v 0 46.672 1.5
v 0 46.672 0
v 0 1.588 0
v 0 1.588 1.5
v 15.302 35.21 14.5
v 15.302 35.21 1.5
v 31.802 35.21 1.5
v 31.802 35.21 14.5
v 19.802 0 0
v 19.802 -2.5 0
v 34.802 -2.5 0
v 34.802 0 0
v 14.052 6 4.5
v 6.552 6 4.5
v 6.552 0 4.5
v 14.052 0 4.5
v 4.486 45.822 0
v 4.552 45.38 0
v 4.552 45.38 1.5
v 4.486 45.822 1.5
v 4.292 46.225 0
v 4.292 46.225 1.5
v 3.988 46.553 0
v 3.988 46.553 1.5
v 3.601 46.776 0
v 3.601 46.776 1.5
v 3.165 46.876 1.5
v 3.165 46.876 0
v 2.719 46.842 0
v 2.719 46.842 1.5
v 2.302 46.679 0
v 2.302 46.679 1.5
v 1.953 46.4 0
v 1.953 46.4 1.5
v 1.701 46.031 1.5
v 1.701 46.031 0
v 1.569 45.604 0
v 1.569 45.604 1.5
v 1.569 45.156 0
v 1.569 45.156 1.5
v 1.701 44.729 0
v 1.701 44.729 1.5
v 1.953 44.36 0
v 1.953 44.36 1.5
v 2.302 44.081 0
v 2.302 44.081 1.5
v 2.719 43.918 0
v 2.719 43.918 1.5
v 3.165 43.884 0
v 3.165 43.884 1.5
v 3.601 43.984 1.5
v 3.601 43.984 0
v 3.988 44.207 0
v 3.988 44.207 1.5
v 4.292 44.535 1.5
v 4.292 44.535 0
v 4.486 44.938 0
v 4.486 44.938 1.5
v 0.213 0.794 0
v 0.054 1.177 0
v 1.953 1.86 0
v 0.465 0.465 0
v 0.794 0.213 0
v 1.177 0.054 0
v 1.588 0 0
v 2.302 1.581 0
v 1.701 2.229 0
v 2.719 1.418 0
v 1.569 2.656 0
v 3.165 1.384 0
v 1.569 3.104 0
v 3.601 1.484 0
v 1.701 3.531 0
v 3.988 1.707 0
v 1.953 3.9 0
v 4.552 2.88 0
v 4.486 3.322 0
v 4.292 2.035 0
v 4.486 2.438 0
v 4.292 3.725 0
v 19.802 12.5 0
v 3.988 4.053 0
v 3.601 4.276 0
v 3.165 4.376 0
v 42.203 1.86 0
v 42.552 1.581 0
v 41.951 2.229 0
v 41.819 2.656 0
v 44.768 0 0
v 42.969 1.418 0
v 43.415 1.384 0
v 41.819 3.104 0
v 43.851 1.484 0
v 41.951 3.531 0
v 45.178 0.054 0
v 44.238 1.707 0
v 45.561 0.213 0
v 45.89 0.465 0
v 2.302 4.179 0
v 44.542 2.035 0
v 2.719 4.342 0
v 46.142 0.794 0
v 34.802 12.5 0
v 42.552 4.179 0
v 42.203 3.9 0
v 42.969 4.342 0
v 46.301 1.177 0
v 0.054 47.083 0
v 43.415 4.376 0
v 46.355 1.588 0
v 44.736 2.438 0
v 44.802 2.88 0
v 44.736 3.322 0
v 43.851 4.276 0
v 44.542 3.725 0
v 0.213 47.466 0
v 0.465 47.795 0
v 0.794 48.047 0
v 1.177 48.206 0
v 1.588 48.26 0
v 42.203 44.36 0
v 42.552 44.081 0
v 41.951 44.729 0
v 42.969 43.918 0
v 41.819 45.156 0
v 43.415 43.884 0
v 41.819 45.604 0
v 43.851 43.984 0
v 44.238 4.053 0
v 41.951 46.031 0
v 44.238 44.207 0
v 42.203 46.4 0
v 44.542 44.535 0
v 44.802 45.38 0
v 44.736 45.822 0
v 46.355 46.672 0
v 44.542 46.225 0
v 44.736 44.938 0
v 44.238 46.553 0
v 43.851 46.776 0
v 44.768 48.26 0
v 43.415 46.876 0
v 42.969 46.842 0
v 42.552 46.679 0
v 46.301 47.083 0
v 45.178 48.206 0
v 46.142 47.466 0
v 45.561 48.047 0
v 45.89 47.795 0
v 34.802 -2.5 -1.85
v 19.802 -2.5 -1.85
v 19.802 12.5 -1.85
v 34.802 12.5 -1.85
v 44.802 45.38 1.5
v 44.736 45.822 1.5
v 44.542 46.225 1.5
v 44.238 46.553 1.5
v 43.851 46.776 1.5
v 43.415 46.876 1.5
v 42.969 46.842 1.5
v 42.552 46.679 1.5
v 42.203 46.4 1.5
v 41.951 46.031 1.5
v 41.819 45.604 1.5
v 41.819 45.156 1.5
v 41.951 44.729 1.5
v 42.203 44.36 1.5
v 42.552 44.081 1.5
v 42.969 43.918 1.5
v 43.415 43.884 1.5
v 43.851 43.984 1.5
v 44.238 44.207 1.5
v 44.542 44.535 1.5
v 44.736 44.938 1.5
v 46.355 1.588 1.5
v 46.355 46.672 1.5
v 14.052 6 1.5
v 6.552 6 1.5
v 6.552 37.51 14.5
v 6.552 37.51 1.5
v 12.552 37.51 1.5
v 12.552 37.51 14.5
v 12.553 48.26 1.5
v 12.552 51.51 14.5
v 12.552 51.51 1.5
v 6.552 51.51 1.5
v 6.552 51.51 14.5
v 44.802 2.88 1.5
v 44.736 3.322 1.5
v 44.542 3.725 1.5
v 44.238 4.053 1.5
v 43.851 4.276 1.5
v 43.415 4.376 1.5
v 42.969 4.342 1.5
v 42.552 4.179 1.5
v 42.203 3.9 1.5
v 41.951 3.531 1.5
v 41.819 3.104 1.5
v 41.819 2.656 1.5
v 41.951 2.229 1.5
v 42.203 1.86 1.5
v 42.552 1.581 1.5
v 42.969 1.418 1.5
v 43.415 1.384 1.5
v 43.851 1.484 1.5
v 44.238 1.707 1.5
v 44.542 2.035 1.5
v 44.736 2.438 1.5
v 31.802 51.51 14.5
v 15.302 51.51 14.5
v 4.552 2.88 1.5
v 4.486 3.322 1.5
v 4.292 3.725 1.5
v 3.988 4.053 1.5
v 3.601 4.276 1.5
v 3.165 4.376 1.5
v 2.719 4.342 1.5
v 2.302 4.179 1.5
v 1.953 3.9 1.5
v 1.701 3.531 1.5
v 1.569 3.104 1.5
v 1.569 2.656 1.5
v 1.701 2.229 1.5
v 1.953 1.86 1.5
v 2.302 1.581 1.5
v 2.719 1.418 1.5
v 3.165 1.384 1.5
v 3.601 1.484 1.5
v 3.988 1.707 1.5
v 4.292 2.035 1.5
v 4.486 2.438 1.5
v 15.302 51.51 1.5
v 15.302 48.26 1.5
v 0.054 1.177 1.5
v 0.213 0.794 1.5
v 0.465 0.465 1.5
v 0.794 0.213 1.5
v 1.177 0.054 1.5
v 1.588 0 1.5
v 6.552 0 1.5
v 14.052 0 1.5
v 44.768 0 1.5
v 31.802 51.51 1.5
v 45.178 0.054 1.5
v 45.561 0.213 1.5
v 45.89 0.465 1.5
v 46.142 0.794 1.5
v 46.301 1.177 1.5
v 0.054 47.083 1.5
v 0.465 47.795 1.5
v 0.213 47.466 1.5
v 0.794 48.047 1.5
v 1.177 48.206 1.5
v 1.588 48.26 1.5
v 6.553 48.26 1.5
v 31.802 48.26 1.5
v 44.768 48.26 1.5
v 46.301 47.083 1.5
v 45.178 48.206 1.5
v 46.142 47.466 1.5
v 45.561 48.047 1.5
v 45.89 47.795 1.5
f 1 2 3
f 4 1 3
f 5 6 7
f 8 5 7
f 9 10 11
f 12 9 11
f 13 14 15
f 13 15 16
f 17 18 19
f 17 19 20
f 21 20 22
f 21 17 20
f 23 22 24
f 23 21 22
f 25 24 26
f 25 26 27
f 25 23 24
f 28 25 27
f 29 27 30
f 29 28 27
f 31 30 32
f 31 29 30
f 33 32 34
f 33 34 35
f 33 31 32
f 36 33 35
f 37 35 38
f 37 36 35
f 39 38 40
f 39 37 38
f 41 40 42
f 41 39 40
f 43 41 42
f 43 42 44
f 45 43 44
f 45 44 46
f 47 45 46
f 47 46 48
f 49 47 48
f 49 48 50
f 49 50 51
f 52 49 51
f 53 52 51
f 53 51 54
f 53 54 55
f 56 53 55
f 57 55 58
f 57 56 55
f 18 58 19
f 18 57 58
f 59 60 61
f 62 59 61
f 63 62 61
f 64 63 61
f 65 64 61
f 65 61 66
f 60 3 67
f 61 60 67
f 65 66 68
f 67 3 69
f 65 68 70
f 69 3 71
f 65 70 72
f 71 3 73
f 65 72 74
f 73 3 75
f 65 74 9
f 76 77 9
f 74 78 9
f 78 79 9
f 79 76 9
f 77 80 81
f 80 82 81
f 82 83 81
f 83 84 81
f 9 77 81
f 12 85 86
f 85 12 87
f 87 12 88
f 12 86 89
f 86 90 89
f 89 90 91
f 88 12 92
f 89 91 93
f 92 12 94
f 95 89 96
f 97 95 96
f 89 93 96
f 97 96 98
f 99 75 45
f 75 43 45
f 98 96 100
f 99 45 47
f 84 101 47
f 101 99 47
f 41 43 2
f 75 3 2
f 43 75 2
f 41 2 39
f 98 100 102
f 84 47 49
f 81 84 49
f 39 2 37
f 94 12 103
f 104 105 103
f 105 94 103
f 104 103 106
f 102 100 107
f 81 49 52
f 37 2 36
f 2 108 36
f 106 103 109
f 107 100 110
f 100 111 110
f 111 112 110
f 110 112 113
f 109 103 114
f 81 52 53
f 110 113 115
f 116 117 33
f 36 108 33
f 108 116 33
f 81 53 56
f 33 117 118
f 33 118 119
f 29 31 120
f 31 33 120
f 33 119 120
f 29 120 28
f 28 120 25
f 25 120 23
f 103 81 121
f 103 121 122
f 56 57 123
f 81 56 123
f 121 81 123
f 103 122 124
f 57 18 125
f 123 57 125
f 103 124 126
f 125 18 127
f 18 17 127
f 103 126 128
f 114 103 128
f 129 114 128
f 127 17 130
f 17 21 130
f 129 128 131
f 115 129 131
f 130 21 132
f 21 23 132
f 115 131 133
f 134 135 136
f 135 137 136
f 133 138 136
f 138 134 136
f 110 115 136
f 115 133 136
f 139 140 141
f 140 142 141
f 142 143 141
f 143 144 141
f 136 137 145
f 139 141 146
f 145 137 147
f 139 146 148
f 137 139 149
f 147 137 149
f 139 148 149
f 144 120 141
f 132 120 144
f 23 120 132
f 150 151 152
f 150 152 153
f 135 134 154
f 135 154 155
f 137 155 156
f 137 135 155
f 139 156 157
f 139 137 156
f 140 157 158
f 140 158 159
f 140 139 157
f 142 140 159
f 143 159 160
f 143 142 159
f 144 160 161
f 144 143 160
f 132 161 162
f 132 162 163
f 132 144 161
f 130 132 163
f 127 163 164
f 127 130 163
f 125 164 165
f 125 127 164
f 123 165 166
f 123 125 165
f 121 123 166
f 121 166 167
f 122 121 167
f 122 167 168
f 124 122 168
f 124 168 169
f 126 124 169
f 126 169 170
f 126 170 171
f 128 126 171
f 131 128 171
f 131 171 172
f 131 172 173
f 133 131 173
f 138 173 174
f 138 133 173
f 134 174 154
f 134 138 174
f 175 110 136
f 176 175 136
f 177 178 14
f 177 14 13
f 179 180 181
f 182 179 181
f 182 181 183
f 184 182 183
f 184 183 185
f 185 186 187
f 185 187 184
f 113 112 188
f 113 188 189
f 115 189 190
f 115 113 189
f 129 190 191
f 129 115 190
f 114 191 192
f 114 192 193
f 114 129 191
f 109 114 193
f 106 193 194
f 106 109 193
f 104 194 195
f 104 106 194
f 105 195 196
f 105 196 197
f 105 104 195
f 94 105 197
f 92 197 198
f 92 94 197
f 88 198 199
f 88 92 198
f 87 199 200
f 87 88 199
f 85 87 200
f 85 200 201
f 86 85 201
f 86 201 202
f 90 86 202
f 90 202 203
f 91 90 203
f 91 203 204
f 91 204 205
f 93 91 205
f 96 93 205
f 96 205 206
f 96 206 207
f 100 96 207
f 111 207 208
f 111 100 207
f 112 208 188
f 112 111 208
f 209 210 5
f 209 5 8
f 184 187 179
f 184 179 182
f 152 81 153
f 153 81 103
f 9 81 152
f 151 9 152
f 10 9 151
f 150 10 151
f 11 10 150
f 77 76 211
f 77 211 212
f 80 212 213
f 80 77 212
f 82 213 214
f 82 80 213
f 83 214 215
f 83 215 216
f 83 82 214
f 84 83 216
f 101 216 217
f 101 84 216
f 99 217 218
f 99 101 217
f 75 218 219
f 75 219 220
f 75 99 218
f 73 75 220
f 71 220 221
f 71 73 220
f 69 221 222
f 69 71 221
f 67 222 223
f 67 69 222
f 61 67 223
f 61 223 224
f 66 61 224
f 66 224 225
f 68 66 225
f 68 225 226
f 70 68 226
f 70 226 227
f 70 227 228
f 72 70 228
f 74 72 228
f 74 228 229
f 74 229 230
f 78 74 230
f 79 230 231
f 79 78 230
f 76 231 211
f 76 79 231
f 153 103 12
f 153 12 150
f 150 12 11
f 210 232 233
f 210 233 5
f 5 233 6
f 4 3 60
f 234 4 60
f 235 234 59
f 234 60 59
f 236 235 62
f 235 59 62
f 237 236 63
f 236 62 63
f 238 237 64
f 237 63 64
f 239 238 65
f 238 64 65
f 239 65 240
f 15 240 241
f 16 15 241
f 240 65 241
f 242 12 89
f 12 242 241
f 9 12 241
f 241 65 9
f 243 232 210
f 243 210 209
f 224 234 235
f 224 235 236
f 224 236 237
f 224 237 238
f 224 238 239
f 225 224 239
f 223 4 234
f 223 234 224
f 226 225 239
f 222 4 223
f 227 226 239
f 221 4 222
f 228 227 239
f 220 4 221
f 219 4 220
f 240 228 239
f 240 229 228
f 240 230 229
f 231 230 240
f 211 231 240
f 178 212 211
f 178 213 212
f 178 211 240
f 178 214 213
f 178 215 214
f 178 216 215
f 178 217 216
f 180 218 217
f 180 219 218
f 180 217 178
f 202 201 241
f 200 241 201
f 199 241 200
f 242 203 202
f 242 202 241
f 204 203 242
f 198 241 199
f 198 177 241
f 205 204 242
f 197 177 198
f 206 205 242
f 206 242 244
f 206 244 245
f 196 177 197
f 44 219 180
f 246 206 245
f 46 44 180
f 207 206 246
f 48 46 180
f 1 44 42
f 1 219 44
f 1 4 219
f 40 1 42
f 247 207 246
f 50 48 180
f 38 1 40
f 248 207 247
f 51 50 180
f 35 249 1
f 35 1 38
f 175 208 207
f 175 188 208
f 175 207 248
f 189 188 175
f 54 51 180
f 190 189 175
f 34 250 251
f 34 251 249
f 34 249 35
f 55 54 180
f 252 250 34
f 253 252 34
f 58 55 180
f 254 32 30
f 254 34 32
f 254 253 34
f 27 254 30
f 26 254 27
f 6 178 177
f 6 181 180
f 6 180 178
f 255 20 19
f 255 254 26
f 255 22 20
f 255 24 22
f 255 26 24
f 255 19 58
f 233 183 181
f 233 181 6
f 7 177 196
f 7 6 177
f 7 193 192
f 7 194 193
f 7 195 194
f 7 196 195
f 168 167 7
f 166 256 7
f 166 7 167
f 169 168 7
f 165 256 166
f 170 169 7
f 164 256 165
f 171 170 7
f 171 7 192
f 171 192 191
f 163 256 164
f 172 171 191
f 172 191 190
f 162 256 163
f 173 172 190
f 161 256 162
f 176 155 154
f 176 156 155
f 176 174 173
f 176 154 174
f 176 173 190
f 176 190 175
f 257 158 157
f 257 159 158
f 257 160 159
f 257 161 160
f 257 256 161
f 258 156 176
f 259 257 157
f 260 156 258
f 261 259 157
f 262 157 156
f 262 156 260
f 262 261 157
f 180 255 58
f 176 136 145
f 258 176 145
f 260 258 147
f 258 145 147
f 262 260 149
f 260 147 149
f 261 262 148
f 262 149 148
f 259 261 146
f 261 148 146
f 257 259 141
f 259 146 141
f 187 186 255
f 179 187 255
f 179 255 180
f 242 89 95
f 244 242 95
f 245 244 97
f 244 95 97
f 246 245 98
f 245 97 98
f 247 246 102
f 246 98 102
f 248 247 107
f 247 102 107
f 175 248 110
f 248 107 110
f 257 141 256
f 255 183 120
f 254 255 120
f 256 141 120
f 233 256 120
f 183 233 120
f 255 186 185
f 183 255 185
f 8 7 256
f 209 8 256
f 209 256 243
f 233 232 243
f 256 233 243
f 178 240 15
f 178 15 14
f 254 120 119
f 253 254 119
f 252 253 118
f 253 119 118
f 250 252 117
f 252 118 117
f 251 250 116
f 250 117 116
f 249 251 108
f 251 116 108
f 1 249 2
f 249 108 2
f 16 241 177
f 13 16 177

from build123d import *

# Parameters (mm, degrees)
F0_R     = 2.5
F0_R_2   = 1.5
F1_DEPTH = 1.5
F2_W     = 6
F2_H     = 3.25
F2_W_2   = 16.5
F2_H_2   = 10.75
F2_H_3   = 13.05
F3_DEPTH = 13
F2_W_3   = 7.5
F2_H_4   = 6
F4_DEPTH = 3
F5_W     = 15
F5_H     = 15
F6_DEPTH = 1.85


with BuildPart() as f1:
    # F0 (on Top) → F1 (new body)
    with BuildSketch(Plane.XY):
        with BuildLine():
            ThreePointArc((0, 1.5875), (0.464968, 0.464968), (1.5875, 0))
            Line((1.5875, 0), (44.7675, 0))
            ThreePointArc((44.7675, 0), (45.890032, 0.464968), (46.355, 1.5875))
            Line((46.355, 1.5875), (46.355, 46.6725))
            ThreePointArc((46.355, 46.6725), (45.890032, 47.795032), (44.7675, 48.26))
            Line((44.7675, 48.26), (1.5875, 48.26))
            ThreePointArc((1.5875, 48.26), (0.464968, 47.795032), (0, 46.6725))
            Line((0, 46.6725), (0, 1.5875))
        make_face()
        with Locations((3.0525, 2.88)):
            Circle(F0_R, mode=Mode.SUBTRACT)
        with Locations((43.3025, 2.88)):
            Circle(F0_R, mode=Mode.SUBTRACT)
        with Locations((3.0525, 45.38)):
            Circle(F0_R, mode=Mode.SUBTRACT)
        with Locations((43.3025, 45.38)):
            Circle(F0_R, mode=Mode.SUBTRACT)
        with Locations((3.0525, 2.88)):
            Circle(F0_R)
        with Locations((3.0525, 2.88)):
            Circle(F0_R_2, mode=Mode.SUBTRACT)
        with Locations((43.3025, 2.88)):
            Circle(F0_R)
        with Locations((43.3025, 2.88)):
            Circle(F0_R_2, mode=Mode.SUBTRACT)
        with Locations((43.3025, 45.38)):
            Circle(F0_R)
        with Locations((43.3025, 45.38)):
            Circle(F0_R_2, mode=Mode.SUBTRACT)
        with Locations((3.0525, 45.38)):
            Circle(F0_R)
        with Locations((3.0525, 45.38)):
            Circle(F0_R_2, mode=Mode.SUBTRACT)
    extrude(amount=F1_DEPTH)

    # F2 (on face) → F3 (join)
    with BuildSketch(Plane.XY.offset(1.5)):
        with Locations((9.5525, 49.885)):
            Rectangle(F2_W, F2_H)
        with Locations((23.5525, 49.885)):
            Rectangle(F2_W_2, F2_H)
        with Locations((9.5525, 42.885)):
            Rectangle(F2_W, F2_H_2)
        with Locations((23.5525, 41.735)):
            Rectangle(F2_W_2, F2_H_3)
    extrude(amount=F3_DEPTH)

    # F2 (on face) → F4 (join)
    with BuildSketch(Plane.XY.offset(1.5)):
        with Locations((10.3025, 3)):
            Rectangle(F2_W_3, F2_H_4)
    extrude(amount=F4_DEPTH)

    # F5 (on face) → F6 (join)
    with BuildSketch(Plane(origin=(0, 0, 0), x_dir=(1, 0, 0), z_dir=(0, 0, -1))):
        with Locations((27.3025, -5)):
            Rectangle(F5_W, F5_H)
    extrude(amount=F6_DEPTH)


solid = f1.part
